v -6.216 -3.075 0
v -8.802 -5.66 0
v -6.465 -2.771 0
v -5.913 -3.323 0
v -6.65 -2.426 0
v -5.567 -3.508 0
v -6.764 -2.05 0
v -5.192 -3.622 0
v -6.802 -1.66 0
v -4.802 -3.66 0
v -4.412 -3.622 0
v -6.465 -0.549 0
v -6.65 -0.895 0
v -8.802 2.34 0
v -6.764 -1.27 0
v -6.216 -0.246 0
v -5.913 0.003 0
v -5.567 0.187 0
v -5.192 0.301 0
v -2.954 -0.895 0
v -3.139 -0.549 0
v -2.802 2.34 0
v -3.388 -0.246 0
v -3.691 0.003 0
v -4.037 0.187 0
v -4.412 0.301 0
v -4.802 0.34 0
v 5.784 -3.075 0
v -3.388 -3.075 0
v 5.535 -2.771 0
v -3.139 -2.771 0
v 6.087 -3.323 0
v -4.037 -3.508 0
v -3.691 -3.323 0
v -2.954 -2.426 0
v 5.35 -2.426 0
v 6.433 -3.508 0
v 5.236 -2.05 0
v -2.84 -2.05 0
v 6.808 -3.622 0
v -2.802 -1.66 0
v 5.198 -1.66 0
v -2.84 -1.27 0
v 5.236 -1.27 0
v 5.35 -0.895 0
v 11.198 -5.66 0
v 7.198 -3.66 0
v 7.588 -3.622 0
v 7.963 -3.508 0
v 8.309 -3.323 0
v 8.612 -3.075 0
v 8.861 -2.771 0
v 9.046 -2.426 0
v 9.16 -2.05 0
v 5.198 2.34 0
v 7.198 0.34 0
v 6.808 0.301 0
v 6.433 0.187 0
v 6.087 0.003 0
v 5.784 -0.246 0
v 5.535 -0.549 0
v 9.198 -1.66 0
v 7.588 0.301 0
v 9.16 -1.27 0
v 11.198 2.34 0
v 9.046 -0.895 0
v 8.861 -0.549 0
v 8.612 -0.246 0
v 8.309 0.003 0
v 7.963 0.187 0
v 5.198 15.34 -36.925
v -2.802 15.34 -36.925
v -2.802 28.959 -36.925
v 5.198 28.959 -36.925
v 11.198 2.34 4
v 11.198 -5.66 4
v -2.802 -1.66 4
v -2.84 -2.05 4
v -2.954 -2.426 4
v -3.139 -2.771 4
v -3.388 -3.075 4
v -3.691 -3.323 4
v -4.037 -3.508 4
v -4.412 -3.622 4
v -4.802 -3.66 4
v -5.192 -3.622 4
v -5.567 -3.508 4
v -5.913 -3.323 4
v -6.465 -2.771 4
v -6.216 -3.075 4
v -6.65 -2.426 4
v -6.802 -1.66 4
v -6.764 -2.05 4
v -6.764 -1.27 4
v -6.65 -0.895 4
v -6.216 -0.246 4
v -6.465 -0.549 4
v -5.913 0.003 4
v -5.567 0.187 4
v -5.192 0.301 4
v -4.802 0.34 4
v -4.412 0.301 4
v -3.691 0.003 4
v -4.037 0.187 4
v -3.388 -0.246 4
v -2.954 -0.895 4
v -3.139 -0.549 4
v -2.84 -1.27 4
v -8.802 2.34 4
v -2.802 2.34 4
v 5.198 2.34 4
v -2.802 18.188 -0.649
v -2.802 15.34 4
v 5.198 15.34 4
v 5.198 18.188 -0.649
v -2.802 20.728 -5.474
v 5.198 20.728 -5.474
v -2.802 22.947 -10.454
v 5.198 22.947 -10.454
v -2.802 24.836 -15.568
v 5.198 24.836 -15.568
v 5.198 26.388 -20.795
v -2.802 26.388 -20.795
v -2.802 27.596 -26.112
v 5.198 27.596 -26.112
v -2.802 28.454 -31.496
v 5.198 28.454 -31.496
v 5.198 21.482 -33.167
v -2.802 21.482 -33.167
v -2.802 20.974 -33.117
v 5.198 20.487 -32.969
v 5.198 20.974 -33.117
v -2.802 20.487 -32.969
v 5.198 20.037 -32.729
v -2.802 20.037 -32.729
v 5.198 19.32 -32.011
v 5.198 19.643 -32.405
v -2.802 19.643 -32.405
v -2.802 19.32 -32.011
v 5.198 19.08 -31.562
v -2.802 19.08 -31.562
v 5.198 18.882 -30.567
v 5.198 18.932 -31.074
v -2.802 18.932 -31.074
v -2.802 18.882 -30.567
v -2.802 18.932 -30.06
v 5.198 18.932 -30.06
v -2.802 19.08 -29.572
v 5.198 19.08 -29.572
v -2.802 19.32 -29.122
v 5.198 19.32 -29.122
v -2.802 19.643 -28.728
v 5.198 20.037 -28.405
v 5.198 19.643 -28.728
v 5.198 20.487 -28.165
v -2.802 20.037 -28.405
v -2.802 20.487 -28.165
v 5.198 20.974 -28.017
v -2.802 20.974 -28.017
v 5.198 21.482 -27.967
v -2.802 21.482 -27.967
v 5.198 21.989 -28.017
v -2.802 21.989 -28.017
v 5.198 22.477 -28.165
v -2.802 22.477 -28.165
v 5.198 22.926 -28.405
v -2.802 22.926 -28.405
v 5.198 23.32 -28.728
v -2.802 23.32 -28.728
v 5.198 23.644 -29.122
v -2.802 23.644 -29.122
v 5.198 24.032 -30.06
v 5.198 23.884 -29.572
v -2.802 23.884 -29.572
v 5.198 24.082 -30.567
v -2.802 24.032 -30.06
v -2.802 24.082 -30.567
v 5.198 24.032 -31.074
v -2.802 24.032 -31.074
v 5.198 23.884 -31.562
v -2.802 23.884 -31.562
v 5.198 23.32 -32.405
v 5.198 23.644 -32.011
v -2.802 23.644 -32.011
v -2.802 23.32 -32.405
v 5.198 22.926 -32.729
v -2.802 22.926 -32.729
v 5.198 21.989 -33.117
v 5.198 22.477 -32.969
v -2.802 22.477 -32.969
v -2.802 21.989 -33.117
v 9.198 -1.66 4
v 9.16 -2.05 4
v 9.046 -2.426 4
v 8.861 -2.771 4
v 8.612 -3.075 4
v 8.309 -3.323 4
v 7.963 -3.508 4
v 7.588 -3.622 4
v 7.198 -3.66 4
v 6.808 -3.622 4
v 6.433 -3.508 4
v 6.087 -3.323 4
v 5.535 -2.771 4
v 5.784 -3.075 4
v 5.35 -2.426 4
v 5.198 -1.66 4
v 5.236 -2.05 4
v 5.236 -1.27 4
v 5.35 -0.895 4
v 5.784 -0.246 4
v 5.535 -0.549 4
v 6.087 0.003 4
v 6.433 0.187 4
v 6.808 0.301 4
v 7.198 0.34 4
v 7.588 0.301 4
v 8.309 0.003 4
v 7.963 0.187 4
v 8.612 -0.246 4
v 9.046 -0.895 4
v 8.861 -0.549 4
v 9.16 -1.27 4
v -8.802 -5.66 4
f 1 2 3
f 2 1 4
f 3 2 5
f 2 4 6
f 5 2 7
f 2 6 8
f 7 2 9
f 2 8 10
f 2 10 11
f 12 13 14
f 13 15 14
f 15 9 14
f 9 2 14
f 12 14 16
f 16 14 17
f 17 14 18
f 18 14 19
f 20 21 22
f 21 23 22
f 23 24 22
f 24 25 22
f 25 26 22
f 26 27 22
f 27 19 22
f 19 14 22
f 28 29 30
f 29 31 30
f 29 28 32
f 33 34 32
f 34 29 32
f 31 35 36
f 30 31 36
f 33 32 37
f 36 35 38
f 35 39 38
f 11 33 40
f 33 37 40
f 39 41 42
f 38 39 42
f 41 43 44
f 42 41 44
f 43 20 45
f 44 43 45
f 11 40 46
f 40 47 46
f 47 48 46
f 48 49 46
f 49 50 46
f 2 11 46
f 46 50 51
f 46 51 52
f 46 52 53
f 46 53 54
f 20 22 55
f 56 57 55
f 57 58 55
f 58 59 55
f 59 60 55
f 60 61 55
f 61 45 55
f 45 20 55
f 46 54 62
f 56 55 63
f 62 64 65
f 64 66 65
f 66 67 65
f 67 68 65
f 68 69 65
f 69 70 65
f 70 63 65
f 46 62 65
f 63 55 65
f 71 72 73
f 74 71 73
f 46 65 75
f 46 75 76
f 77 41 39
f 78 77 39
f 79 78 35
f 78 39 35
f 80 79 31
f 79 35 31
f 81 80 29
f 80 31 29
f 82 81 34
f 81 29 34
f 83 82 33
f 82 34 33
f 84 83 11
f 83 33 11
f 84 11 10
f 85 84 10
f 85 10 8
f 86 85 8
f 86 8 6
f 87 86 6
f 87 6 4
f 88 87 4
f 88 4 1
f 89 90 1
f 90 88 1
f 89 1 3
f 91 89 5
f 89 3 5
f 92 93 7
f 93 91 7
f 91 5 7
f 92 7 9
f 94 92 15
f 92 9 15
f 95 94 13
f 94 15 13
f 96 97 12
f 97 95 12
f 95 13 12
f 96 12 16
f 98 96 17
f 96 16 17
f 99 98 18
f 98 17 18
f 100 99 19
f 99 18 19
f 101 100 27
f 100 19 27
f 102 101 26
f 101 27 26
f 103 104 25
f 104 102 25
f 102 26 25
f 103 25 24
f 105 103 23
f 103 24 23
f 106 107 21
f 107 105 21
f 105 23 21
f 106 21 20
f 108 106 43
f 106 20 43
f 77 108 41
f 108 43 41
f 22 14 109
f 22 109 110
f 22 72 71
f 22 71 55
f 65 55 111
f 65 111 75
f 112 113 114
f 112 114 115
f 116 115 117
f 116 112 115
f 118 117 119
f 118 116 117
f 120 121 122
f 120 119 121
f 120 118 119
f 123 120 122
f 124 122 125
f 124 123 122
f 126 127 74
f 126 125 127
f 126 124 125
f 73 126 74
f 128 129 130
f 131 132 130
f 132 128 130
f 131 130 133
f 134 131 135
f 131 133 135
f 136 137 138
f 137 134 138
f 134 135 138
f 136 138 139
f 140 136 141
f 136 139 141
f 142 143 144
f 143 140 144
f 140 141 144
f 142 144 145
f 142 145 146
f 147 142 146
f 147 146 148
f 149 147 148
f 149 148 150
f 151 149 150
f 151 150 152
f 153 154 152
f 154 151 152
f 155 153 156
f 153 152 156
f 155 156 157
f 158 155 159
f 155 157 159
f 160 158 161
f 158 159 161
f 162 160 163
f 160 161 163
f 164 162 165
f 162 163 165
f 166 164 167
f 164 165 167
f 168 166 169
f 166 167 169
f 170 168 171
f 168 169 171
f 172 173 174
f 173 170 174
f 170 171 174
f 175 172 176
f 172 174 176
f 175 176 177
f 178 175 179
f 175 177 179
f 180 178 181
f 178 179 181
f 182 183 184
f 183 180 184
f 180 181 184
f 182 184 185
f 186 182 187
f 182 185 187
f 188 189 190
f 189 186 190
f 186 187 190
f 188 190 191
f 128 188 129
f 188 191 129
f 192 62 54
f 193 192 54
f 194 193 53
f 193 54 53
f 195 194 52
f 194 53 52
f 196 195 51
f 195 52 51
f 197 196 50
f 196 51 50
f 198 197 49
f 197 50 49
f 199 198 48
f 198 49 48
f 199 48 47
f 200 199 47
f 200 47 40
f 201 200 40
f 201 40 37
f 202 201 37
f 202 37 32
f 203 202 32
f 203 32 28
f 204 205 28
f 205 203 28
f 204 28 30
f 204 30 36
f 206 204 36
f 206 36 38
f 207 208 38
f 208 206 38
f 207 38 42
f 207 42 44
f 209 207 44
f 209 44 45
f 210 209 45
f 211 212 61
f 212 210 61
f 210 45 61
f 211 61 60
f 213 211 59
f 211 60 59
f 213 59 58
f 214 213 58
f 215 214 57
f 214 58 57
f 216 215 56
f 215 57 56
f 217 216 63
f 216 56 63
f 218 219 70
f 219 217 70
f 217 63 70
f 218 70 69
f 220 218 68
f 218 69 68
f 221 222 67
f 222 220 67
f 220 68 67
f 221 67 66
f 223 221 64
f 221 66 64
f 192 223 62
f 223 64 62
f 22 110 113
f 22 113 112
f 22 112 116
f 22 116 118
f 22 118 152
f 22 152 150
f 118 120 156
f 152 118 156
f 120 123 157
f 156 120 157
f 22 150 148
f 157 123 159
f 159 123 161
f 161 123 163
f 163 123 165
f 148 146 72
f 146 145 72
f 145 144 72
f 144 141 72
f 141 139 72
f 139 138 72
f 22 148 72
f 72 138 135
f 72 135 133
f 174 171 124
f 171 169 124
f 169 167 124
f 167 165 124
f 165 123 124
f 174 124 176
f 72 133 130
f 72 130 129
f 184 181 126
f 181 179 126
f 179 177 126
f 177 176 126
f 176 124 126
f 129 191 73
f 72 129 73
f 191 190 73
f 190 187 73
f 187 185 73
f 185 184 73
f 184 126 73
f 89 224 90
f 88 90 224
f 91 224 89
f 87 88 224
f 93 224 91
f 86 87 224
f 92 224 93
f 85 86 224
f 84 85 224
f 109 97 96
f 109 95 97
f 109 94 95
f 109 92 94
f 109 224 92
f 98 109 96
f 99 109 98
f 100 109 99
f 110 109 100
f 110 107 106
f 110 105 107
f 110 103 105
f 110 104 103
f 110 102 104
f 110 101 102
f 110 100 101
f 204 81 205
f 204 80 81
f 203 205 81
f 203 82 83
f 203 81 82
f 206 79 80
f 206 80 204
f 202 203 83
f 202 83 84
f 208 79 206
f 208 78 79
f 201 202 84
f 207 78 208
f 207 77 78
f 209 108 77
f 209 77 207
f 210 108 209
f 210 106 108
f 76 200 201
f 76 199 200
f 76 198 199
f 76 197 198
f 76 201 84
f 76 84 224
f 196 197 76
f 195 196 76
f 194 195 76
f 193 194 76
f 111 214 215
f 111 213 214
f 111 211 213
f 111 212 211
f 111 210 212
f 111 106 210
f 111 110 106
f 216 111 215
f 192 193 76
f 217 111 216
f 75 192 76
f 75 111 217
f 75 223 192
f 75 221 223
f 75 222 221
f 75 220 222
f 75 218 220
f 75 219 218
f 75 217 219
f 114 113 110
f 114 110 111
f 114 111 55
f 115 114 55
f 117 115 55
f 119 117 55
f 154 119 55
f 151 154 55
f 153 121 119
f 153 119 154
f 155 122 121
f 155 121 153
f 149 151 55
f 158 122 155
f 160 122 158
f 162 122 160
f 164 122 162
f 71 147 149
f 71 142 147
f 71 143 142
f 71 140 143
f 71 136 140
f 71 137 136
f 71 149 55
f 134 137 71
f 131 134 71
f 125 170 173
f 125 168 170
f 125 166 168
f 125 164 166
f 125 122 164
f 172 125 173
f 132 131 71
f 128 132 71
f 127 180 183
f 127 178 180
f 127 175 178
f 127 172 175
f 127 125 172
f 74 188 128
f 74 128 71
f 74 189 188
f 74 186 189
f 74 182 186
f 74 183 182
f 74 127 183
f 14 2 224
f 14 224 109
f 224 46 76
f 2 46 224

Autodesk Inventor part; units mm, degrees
ref_plane "YZ Plane" through (0, 0, 0) normal (1, 0, 0) x (0, 1, 0)
ref_plane "XZ Plane" through (0, 0, 0) normal (0, 1, 0) x (-1, 0, 0)
ref_plane "XY Plane" through (0, 0, 0) normal (0, 0, 1) x (1, 0, 0)
sketch "Sketch1" plane through (0, 0, 0) normal (0, 0, 1) x (1, 0, 0)
  line L0 (-8.802, 2.3397) -> (11.198, 2.3397)
  line L1 (11.198, 2.3397) -> (11.198, -5.6603)
  line L2 (11.198, -5.6603) -> (-8.802, -5.6603)
  line L3 (-8.802, -5.6603) -> (-8.802, 2.3397)
  circle A0 centre (-4.802, -1.6603) radius 2
  circle A1 centre (7.198, -1.6603) radius 2
  point P0 (0, 0)
  dimension "d4" = 4
  dimension "d0" = 4
  dimension "d1" = 4
  dimension "d2" = 12
  dimension "d3" = 4
  dimension "d5" = 4
  dimension "d7" = 8
  dimension "d8" = 4
  dimension "d9" = 20
  dimension "d10" = 4
extrude "Extrusion1" add sketch "Sketch1" along normal blind 4
ref_plane "Work Plane1" through (1.198, -5.6603, 0) normal (1, 0, 0) x (0, 0, -1)
sketch "Sketch2" plane through (1.198, -5.6603, 0) normal (1, 0, 0) x (0, 0, -1)
  arc A0 (36.9246, 34.6197) -> (-4, 21) centre (41.9479, -48.7697) ccw
  line L0 (0, 0) -> (0, 8) projected
  line L1 (36.9247, 21) -> (36.9246, 34.6197)
  arc A1 (44.549, 70.6711) -> (-44.2597, 70.8526) centre (0, 0) ccw
  circle A2 centre (9.9821, 76.8133) radius 2.6
  line L2 (9.9821, 96.2846) -> (9.9821, 47.2392) construction
  line L3 (62.1306, 76.8133) -> (-24.9977, 76.8133) construction
  line L4 (0, 0) -> (0, 8) construction
  circle A3 centre (30.5669, 27.142) radius 2.6
  line L5 (-4, 0) -> (-4, 8) projected
  line L6 (0, 8) -> (-4, 8) projected
  line L7 (36.9247, 21) -> (0, 8)
  line L8 (0, 8) -> (-4, 8)
  line L9 (36.9247, 21) -> (-4, 21) construction
  line L10 (-4, 21) -> (-4, 8)
  point P0 (0, 5.6603)
  dimension "d15" = 34.5669
  dimension "d16" = 6.1422
  dimension "d17" = 34.5669
  dimension "d22" = 13.6197
  dimension "d27" = 5.2
  dimension "d32" = 6.142
  dimension "d33" = 13
extrude "Extrusion4" add sketch "Sketch2" along normal mid plane 8 contours L1 L7 L6 L10 A0
sketch "Sketch3" plane through (0, 0, 4) normal (0, 0, 1) x (1, 0, 0)
  circle A0 centre (7.198, -1.6603) radius 2 projected
  circle A1 centre (-4.802, -1.6603) radius 2 projected
  line L0 (-8.802, 2.3397) -> (-8.802, -5.6603) projected
  line L1 (-8.802, -5.6603) -> (11.198, -5.6603) projected
  circle A2 centre (1.198, -1.6603) radius 0.6445
  point P0 (0, 0)
  dimension "d28" = 12
  dimension "d29" = 6
  dimension "d30" = 8
  dimension "d31" = 4
equation "\"d4\" = d3"
equation "\"d3\" = d8"
equation "\"d5\" = d4"
equation "\"d29\" = 0.5 * d28"
equation "\"d31\" = 0.5 * d30"
properties part number "motor_elytra_interface" material "Nylon 6/6"
